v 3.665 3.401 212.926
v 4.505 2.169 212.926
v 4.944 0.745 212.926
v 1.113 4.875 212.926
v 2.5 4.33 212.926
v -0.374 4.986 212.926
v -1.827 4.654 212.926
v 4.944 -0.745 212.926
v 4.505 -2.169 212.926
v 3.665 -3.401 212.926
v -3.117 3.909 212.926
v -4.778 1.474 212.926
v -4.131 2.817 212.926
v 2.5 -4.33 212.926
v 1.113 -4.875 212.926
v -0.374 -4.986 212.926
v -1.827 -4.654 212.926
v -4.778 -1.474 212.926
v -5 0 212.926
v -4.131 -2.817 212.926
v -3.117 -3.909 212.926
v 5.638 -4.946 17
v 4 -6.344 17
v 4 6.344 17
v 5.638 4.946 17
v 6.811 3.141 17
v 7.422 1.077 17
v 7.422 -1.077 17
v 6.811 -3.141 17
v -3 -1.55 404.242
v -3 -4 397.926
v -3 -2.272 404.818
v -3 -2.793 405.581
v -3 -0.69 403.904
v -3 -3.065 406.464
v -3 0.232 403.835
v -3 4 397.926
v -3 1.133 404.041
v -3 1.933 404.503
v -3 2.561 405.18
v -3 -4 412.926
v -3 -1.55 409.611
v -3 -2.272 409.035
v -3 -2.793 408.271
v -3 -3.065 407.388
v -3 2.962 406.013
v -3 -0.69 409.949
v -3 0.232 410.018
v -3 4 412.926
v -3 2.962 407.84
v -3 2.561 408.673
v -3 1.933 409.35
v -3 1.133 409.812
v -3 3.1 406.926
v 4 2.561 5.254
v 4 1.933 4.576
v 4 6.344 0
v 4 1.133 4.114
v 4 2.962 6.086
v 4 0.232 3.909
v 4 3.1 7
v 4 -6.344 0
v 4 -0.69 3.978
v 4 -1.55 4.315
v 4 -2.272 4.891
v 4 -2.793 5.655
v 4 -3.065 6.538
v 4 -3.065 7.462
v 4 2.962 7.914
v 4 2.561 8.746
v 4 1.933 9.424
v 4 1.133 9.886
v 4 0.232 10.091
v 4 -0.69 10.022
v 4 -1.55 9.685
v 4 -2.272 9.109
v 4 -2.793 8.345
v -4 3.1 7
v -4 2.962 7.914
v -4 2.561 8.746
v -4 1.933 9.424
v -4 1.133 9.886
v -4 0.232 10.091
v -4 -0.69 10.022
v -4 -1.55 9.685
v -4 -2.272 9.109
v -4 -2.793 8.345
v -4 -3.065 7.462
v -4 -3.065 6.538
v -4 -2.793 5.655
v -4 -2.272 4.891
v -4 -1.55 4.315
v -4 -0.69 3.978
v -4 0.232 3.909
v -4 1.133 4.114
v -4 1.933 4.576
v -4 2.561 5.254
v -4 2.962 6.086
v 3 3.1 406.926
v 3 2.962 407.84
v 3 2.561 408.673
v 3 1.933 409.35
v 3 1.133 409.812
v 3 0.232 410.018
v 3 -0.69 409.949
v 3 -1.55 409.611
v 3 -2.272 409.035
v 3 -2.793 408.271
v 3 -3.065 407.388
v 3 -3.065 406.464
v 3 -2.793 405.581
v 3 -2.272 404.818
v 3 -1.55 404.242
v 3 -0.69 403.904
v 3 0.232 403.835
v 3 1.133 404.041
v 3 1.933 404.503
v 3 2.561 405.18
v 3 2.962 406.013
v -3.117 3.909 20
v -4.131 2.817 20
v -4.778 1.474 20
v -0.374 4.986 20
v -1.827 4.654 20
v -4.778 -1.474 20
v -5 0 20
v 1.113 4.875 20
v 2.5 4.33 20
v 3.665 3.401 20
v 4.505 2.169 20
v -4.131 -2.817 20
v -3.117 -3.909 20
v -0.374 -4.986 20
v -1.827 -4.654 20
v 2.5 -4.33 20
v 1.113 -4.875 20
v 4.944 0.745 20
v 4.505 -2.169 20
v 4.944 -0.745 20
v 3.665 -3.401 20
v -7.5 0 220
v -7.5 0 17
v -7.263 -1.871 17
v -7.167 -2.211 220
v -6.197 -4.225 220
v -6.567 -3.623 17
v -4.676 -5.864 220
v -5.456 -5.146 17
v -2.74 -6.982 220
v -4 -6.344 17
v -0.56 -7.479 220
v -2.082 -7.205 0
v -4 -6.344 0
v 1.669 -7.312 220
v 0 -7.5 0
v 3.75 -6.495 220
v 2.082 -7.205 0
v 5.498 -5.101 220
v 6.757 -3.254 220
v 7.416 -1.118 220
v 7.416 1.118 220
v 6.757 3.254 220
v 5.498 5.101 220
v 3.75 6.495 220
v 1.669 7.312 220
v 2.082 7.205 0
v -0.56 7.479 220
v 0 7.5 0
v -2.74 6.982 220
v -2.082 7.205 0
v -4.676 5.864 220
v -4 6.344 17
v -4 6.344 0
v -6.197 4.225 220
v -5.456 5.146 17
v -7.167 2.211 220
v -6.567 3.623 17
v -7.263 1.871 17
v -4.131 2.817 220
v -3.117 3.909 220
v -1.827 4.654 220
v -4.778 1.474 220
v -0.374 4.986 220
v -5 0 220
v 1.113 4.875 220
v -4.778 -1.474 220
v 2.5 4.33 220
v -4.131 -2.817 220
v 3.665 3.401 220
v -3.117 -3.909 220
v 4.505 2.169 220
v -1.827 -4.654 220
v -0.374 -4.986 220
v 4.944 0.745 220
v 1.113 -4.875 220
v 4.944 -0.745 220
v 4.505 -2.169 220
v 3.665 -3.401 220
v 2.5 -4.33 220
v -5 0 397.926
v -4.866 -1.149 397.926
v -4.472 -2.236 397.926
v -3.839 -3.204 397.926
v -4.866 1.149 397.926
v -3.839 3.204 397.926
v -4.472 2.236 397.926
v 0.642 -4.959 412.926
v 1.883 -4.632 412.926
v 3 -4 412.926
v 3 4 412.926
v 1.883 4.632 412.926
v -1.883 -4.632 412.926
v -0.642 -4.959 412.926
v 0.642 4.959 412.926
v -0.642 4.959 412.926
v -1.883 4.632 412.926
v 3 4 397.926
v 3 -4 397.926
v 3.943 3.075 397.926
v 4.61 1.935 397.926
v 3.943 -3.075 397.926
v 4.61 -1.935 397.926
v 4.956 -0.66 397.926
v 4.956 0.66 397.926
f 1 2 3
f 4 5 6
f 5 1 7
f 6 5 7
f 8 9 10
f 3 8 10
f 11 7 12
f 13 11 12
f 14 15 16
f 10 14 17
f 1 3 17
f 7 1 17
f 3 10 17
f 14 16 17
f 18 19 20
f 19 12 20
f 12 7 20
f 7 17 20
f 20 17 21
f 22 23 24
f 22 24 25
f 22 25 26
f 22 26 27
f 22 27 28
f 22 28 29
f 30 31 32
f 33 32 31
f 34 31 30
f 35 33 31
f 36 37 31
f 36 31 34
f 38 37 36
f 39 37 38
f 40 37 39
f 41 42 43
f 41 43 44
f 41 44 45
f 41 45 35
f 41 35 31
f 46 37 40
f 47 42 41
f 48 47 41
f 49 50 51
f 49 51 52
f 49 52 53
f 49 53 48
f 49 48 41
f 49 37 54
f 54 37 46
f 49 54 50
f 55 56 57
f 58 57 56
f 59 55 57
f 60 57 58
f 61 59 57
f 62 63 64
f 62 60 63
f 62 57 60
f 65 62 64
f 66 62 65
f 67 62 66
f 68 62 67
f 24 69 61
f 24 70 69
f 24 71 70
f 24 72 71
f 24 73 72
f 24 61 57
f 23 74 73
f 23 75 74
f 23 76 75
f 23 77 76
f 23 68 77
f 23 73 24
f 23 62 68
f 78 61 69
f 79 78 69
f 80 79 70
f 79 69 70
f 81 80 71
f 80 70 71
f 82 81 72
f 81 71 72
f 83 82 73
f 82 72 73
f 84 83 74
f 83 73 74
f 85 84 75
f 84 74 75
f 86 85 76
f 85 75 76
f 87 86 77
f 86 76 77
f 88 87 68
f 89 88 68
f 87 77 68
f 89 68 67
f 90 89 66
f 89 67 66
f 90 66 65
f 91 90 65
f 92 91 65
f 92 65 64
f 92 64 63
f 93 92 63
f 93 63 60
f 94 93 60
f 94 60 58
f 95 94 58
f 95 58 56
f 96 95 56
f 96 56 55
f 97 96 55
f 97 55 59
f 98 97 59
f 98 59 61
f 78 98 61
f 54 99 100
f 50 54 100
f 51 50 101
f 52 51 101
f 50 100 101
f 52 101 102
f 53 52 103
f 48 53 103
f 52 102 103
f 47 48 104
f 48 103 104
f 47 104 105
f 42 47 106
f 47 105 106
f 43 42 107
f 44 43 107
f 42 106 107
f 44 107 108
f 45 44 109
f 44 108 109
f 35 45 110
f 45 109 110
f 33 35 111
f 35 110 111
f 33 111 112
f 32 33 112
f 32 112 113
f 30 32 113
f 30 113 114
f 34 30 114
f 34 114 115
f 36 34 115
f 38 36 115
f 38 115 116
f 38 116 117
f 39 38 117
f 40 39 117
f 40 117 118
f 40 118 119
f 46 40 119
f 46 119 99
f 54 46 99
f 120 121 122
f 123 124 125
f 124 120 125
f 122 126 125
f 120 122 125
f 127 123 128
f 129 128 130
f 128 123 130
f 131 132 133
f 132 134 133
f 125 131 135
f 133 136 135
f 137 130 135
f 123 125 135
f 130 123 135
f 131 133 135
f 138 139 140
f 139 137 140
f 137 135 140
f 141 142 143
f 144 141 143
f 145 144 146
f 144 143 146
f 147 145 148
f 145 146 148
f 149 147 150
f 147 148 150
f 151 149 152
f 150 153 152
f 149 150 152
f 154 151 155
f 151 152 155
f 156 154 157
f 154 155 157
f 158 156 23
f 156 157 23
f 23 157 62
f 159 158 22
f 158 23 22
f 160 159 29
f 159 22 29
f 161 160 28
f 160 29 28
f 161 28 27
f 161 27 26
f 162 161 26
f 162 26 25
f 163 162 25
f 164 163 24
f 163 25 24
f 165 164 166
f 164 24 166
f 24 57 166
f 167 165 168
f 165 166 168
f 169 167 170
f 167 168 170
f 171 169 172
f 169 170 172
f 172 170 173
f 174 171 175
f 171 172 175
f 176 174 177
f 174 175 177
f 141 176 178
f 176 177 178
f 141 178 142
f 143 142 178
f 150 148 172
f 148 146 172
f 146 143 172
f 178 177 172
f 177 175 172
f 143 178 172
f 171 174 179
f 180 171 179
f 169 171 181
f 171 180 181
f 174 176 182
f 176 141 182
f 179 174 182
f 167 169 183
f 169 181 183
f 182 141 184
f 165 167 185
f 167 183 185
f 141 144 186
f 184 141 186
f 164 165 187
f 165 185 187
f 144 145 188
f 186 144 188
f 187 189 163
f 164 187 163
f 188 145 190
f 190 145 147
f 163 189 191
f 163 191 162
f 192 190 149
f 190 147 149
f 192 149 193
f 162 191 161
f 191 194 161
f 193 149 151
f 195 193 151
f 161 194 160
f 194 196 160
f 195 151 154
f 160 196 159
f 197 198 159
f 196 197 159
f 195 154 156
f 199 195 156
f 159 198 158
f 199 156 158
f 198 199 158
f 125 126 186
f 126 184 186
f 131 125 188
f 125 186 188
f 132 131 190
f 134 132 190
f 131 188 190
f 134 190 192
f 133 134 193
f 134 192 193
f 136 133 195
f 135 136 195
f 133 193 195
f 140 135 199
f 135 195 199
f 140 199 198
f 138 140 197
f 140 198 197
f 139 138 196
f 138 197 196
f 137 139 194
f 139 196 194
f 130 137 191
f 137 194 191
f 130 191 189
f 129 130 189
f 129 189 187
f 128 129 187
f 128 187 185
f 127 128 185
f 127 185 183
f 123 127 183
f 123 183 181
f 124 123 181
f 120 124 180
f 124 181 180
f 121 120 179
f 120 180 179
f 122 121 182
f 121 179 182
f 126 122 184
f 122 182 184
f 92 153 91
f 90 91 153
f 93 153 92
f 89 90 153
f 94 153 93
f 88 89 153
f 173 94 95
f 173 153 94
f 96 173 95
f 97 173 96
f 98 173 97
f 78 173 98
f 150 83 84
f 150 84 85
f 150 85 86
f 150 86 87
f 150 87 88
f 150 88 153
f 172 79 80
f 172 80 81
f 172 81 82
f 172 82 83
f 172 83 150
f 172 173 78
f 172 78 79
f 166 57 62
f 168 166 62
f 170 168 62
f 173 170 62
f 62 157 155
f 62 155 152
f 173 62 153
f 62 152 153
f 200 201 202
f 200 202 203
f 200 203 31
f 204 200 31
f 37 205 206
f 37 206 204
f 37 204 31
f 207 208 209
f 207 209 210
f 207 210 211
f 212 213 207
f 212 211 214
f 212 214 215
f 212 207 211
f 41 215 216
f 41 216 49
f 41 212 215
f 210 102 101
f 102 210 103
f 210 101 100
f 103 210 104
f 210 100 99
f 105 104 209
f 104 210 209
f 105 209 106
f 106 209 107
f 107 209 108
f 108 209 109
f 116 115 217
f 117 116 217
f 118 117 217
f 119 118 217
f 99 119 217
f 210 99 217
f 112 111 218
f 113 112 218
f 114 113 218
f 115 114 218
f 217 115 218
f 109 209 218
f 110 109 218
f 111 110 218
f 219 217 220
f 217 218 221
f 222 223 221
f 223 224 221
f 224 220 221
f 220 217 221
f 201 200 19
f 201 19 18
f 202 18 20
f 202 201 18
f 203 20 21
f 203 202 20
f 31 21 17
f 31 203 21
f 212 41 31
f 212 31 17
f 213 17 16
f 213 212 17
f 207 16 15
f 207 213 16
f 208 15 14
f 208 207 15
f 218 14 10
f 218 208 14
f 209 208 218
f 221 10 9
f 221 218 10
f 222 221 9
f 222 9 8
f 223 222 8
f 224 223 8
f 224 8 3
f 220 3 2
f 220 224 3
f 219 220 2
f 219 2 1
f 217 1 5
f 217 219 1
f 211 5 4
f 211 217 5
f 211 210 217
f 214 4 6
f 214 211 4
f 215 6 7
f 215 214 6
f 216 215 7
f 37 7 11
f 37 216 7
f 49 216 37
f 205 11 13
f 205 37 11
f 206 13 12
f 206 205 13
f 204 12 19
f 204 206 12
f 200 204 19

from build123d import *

# Parameters (mm, degrees)
F2_W      = 10.873154
F2_H      = 17
F3_DEPTH  = 12.5
F4_W      = 5
F4_H      = 200
F6_R      = 3.1
F7_DEPTH  = 11.501
F9_DEPTH  = 12.5
F10_R     = 3.1
F11_DEPTH = 10.501


with BuildPart() as f1:
    # F0 (on Front) → F1 (revolve)
    with BuildSketch(Plane.XZ):
        Polygon((-7.5, 0), (0, 0), (0, 20), (-5, 20), (-5, 220), (-7.5, 220), align=None)
    revolve(axis=Axis((0, 0, 213.92663), (0, 0, 1)))

    # F2 (on Front) → F3 (cut, symmetric)
    with BuildSketch(Plane.XZ):
        with Locations((-9.436577, 8.5)):
            Rectangle(F2_W, F2_H)
        with Locations((9.436577, 8.5)):
            Rectangle(F2_W, F2_H)
    extrude(amount=F3_DEPTH, both=True, mode=Mode.SUBTRACT)

    # F6 (on face) → F7 (cut, through all)
    with BuildSketch(Plane.YZ.offset(4)):
        with Locations((0, 7)):
            Circle(F6_R)
    extrude(amount=-F7_DEPTH, mode=Mode.SUBTRACT)


with BuildPart() as f5:
    # F4 (on Front) → F5 (revolve)
    with BuildSketch(Plane.XZ):
        with Locations((-2.5, 312.926278)):
            Rectangle(F4_W, F4_H)
    revolve(axis=Axis((0, 0, 213.92663), (0, 0, 1)))

    # F8 (on Front) → F9 (cut, symmetric)
    with BuildSketch(Plane.XZ):
        Polygon((-3, 412.970006), (-9.712847, 412.926278), (-9.712847, 397.926278), (-3, 397.926278), align=None)
        Polygon((3, 412.970006), (3, 397.926278), (9.712847, 397.926278), (9.712847, 412.926278), align=None)
    extrude(amount=F9_DEPTH, both=True, mode=Mode.SUBTRACT)

    # F10 (on face) → F11 (cut, through all)
    with BuildSketch(Plane.YZ.offset(3)):
        with Locations((0, 406.926278)):
            Circle(F10_R)
    extrude(amount=-F11_DEPTH, mode=Mode.SUBTRACT)


solid = Compound([f1.part, f5.part])
